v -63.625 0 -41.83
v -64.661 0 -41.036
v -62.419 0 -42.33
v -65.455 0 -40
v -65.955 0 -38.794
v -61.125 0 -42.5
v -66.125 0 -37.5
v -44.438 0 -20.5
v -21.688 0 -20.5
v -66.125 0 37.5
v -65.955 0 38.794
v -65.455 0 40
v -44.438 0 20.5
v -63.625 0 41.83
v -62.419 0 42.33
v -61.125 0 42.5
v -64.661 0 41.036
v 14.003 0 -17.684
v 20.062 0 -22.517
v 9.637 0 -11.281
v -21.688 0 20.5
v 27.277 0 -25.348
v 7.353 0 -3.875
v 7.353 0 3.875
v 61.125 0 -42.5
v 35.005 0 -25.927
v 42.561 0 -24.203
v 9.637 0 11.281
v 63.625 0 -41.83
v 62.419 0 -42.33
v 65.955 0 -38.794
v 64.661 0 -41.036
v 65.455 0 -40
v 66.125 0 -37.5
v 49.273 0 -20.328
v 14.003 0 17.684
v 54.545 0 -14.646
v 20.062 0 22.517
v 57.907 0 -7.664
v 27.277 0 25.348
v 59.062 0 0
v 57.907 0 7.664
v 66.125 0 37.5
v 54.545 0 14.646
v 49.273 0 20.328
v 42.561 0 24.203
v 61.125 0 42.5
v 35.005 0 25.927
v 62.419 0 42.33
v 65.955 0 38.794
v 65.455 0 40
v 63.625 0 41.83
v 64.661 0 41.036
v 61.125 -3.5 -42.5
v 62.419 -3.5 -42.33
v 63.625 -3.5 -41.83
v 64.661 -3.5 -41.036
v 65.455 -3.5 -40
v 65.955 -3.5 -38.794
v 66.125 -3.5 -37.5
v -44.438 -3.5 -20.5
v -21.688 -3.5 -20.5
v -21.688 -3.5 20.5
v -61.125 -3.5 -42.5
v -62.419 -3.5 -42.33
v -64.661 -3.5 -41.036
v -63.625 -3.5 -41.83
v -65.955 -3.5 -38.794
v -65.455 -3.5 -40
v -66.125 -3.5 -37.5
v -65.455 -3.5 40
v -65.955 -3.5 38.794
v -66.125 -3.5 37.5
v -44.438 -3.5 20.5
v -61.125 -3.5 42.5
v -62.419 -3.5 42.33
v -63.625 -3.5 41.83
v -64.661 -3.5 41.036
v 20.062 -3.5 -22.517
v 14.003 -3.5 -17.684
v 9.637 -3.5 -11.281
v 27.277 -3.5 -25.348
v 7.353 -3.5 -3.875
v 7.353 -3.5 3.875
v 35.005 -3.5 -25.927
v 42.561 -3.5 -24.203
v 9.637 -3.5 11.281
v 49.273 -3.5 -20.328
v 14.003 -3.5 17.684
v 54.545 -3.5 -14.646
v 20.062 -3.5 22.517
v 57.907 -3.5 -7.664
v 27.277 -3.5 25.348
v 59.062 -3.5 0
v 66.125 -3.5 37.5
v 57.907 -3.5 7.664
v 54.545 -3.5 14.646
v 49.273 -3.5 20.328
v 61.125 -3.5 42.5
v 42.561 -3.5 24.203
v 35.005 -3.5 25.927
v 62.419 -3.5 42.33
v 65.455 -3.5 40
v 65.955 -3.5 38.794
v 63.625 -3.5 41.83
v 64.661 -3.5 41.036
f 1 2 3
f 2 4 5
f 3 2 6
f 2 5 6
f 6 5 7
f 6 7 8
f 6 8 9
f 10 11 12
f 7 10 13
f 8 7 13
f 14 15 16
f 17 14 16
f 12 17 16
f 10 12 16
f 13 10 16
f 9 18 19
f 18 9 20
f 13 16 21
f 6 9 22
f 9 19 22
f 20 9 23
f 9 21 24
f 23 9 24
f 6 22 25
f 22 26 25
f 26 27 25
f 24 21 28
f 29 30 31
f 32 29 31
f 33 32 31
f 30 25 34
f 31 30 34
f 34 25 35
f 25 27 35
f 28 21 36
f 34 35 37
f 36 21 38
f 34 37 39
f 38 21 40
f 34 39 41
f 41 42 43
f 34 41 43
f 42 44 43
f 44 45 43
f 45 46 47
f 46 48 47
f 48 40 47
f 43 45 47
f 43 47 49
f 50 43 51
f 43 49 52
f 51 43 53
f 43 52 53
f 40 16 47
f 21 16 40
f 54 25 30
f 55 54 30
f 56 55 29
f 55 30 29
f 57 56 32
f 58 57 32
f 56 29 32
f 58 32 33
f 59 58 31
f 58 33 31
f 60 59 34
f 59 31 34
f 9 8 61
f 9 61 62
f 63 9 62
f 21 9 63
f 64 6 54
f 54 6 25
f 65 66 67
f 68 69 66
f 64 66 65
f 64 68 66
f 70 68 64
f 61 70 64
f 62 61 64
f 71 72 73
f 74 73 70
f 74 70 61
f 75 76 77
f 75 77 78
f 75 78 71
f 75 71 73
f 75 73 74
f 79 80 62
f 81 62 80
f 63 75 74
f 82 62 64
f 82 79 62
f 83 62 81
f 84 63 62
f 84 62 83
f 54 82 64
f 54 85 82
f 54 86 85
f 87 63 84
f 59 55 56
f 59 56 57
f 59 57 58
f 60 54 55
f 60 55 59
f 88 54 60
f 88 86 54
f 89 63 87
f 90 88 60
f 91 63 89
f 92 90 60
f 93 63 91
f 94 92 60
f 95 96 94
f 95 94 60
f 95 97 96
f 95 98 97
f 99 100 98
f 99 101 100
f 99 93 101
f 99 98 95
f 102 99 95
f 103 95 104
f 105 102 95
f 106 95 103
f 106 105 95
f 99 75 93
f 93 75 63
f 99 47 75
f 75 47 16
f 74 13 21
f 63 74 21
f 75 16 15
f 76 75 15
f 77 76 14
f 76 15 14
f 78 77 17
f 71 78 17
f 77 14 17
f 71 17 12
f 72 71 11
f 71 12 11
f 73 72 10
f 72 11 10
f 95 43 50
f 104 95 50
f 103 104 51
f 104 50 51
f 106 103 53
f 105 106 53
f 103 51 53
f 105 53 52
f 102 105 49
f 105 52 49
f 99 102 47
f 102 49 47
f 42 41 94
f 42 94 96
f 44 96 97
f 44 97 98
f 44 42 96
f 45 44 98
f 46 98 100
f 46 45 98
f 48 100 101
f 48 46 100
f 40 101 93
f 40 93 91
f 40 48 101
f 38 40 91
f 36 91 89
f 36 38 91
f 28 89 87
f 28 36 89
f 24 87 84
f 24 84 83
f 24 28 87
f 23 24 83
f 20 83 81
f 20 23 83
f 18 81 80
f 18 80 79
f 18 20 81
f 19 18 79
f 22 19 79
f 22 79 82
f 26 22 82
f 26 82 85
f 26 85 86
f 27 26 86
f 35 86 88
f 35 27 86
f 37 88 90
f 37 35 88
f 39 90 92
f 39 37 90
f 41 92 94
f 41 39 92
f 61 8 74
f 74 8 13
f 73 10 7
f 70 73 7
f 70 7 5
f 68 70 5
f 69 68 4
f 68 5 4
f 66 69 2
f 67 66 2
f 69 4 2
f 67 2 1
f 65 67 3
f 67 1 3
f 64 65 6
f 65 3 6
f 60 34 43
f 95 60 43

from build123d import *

# Parameters (mm, degrees)
F0_W     = 22.75
F0_H     = 41
F0_R     = 26
F1_DEPTH = 3.5


with BuildPart() as f1:
    # F0 (on Front) → F1 (new body)
    with BuildSketch(Plane.XZ):
        with BuildLine():
            Line((-61.125, -42.5), (61.125, -42.5))
            ThreePointArc((61.125, -42.5), (64.660534, -41.035534), (66.125, -37.5))
            Line((66.125, -37.5), (66.125, 37.5))
            ThreePointArc((66.125, 37.5), (64.660534, 41.035534), (61.125, 42.5))
            Line((61.125, 42.5), (-61.125, 42.5))
            ThreePointArc((-61.125, 42.5), (-64.660534, 41.035534), (-66.125, 37.5))
            Line((-66.125, 37.5), (-66.125, -37.5))
            ThreePointArc((-66.125, -37.5), (-64.660534, -41.035534), (-61.125, -42.5))
        make_face()
        with Locations((-33.0625, 0)):
            Rectangle(F0_W, F0_H, mode=Mode.SUBTRACT)
        with Locations((33.0625, 0)):
            Circle(F0_R, mode=Mode.SUBTRACT)
    extrude(amount=F1_DEPTH)


solid = f1.part
